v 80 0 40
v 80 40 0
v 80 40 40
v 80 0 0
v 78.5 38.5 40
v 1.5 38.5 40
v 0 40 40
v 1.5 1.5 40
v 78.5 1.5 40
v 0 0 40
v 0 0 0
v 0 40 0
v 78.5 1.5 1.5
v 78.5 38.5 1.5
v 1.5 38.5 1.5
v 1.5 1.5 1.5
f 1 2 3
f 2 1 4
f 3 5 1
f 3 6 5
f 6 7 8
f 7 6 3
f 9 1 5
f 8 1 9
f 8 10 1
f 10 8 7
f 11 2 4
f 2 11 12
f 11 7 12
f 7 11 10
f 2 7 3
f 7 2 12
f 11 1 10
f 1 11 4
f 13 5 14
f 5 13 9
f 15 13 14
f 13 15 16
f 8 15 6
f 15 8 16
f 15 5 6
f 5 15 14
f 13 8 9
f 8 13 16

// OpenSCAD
$fn = 32;

// ----------------------------------------------------------------------
// Open box: 1.5 mm walls
// ----------------------------------------------------------------------

// --- parameters (mm) ---
box_l = 80;               // outer length, X
box_w = 40;               // outer width, Y
box_h = 40;               // outer height, Z
wall = 1.5;               // wall thickness
floor = 1.5;              // floor thickness

difference() {
  cube([box_l, box_w, box_h]);
  translate([wall, wall, floor])
    cube([box_l - 2 * wall, box_w - 2 * wall, box_h]);
}
